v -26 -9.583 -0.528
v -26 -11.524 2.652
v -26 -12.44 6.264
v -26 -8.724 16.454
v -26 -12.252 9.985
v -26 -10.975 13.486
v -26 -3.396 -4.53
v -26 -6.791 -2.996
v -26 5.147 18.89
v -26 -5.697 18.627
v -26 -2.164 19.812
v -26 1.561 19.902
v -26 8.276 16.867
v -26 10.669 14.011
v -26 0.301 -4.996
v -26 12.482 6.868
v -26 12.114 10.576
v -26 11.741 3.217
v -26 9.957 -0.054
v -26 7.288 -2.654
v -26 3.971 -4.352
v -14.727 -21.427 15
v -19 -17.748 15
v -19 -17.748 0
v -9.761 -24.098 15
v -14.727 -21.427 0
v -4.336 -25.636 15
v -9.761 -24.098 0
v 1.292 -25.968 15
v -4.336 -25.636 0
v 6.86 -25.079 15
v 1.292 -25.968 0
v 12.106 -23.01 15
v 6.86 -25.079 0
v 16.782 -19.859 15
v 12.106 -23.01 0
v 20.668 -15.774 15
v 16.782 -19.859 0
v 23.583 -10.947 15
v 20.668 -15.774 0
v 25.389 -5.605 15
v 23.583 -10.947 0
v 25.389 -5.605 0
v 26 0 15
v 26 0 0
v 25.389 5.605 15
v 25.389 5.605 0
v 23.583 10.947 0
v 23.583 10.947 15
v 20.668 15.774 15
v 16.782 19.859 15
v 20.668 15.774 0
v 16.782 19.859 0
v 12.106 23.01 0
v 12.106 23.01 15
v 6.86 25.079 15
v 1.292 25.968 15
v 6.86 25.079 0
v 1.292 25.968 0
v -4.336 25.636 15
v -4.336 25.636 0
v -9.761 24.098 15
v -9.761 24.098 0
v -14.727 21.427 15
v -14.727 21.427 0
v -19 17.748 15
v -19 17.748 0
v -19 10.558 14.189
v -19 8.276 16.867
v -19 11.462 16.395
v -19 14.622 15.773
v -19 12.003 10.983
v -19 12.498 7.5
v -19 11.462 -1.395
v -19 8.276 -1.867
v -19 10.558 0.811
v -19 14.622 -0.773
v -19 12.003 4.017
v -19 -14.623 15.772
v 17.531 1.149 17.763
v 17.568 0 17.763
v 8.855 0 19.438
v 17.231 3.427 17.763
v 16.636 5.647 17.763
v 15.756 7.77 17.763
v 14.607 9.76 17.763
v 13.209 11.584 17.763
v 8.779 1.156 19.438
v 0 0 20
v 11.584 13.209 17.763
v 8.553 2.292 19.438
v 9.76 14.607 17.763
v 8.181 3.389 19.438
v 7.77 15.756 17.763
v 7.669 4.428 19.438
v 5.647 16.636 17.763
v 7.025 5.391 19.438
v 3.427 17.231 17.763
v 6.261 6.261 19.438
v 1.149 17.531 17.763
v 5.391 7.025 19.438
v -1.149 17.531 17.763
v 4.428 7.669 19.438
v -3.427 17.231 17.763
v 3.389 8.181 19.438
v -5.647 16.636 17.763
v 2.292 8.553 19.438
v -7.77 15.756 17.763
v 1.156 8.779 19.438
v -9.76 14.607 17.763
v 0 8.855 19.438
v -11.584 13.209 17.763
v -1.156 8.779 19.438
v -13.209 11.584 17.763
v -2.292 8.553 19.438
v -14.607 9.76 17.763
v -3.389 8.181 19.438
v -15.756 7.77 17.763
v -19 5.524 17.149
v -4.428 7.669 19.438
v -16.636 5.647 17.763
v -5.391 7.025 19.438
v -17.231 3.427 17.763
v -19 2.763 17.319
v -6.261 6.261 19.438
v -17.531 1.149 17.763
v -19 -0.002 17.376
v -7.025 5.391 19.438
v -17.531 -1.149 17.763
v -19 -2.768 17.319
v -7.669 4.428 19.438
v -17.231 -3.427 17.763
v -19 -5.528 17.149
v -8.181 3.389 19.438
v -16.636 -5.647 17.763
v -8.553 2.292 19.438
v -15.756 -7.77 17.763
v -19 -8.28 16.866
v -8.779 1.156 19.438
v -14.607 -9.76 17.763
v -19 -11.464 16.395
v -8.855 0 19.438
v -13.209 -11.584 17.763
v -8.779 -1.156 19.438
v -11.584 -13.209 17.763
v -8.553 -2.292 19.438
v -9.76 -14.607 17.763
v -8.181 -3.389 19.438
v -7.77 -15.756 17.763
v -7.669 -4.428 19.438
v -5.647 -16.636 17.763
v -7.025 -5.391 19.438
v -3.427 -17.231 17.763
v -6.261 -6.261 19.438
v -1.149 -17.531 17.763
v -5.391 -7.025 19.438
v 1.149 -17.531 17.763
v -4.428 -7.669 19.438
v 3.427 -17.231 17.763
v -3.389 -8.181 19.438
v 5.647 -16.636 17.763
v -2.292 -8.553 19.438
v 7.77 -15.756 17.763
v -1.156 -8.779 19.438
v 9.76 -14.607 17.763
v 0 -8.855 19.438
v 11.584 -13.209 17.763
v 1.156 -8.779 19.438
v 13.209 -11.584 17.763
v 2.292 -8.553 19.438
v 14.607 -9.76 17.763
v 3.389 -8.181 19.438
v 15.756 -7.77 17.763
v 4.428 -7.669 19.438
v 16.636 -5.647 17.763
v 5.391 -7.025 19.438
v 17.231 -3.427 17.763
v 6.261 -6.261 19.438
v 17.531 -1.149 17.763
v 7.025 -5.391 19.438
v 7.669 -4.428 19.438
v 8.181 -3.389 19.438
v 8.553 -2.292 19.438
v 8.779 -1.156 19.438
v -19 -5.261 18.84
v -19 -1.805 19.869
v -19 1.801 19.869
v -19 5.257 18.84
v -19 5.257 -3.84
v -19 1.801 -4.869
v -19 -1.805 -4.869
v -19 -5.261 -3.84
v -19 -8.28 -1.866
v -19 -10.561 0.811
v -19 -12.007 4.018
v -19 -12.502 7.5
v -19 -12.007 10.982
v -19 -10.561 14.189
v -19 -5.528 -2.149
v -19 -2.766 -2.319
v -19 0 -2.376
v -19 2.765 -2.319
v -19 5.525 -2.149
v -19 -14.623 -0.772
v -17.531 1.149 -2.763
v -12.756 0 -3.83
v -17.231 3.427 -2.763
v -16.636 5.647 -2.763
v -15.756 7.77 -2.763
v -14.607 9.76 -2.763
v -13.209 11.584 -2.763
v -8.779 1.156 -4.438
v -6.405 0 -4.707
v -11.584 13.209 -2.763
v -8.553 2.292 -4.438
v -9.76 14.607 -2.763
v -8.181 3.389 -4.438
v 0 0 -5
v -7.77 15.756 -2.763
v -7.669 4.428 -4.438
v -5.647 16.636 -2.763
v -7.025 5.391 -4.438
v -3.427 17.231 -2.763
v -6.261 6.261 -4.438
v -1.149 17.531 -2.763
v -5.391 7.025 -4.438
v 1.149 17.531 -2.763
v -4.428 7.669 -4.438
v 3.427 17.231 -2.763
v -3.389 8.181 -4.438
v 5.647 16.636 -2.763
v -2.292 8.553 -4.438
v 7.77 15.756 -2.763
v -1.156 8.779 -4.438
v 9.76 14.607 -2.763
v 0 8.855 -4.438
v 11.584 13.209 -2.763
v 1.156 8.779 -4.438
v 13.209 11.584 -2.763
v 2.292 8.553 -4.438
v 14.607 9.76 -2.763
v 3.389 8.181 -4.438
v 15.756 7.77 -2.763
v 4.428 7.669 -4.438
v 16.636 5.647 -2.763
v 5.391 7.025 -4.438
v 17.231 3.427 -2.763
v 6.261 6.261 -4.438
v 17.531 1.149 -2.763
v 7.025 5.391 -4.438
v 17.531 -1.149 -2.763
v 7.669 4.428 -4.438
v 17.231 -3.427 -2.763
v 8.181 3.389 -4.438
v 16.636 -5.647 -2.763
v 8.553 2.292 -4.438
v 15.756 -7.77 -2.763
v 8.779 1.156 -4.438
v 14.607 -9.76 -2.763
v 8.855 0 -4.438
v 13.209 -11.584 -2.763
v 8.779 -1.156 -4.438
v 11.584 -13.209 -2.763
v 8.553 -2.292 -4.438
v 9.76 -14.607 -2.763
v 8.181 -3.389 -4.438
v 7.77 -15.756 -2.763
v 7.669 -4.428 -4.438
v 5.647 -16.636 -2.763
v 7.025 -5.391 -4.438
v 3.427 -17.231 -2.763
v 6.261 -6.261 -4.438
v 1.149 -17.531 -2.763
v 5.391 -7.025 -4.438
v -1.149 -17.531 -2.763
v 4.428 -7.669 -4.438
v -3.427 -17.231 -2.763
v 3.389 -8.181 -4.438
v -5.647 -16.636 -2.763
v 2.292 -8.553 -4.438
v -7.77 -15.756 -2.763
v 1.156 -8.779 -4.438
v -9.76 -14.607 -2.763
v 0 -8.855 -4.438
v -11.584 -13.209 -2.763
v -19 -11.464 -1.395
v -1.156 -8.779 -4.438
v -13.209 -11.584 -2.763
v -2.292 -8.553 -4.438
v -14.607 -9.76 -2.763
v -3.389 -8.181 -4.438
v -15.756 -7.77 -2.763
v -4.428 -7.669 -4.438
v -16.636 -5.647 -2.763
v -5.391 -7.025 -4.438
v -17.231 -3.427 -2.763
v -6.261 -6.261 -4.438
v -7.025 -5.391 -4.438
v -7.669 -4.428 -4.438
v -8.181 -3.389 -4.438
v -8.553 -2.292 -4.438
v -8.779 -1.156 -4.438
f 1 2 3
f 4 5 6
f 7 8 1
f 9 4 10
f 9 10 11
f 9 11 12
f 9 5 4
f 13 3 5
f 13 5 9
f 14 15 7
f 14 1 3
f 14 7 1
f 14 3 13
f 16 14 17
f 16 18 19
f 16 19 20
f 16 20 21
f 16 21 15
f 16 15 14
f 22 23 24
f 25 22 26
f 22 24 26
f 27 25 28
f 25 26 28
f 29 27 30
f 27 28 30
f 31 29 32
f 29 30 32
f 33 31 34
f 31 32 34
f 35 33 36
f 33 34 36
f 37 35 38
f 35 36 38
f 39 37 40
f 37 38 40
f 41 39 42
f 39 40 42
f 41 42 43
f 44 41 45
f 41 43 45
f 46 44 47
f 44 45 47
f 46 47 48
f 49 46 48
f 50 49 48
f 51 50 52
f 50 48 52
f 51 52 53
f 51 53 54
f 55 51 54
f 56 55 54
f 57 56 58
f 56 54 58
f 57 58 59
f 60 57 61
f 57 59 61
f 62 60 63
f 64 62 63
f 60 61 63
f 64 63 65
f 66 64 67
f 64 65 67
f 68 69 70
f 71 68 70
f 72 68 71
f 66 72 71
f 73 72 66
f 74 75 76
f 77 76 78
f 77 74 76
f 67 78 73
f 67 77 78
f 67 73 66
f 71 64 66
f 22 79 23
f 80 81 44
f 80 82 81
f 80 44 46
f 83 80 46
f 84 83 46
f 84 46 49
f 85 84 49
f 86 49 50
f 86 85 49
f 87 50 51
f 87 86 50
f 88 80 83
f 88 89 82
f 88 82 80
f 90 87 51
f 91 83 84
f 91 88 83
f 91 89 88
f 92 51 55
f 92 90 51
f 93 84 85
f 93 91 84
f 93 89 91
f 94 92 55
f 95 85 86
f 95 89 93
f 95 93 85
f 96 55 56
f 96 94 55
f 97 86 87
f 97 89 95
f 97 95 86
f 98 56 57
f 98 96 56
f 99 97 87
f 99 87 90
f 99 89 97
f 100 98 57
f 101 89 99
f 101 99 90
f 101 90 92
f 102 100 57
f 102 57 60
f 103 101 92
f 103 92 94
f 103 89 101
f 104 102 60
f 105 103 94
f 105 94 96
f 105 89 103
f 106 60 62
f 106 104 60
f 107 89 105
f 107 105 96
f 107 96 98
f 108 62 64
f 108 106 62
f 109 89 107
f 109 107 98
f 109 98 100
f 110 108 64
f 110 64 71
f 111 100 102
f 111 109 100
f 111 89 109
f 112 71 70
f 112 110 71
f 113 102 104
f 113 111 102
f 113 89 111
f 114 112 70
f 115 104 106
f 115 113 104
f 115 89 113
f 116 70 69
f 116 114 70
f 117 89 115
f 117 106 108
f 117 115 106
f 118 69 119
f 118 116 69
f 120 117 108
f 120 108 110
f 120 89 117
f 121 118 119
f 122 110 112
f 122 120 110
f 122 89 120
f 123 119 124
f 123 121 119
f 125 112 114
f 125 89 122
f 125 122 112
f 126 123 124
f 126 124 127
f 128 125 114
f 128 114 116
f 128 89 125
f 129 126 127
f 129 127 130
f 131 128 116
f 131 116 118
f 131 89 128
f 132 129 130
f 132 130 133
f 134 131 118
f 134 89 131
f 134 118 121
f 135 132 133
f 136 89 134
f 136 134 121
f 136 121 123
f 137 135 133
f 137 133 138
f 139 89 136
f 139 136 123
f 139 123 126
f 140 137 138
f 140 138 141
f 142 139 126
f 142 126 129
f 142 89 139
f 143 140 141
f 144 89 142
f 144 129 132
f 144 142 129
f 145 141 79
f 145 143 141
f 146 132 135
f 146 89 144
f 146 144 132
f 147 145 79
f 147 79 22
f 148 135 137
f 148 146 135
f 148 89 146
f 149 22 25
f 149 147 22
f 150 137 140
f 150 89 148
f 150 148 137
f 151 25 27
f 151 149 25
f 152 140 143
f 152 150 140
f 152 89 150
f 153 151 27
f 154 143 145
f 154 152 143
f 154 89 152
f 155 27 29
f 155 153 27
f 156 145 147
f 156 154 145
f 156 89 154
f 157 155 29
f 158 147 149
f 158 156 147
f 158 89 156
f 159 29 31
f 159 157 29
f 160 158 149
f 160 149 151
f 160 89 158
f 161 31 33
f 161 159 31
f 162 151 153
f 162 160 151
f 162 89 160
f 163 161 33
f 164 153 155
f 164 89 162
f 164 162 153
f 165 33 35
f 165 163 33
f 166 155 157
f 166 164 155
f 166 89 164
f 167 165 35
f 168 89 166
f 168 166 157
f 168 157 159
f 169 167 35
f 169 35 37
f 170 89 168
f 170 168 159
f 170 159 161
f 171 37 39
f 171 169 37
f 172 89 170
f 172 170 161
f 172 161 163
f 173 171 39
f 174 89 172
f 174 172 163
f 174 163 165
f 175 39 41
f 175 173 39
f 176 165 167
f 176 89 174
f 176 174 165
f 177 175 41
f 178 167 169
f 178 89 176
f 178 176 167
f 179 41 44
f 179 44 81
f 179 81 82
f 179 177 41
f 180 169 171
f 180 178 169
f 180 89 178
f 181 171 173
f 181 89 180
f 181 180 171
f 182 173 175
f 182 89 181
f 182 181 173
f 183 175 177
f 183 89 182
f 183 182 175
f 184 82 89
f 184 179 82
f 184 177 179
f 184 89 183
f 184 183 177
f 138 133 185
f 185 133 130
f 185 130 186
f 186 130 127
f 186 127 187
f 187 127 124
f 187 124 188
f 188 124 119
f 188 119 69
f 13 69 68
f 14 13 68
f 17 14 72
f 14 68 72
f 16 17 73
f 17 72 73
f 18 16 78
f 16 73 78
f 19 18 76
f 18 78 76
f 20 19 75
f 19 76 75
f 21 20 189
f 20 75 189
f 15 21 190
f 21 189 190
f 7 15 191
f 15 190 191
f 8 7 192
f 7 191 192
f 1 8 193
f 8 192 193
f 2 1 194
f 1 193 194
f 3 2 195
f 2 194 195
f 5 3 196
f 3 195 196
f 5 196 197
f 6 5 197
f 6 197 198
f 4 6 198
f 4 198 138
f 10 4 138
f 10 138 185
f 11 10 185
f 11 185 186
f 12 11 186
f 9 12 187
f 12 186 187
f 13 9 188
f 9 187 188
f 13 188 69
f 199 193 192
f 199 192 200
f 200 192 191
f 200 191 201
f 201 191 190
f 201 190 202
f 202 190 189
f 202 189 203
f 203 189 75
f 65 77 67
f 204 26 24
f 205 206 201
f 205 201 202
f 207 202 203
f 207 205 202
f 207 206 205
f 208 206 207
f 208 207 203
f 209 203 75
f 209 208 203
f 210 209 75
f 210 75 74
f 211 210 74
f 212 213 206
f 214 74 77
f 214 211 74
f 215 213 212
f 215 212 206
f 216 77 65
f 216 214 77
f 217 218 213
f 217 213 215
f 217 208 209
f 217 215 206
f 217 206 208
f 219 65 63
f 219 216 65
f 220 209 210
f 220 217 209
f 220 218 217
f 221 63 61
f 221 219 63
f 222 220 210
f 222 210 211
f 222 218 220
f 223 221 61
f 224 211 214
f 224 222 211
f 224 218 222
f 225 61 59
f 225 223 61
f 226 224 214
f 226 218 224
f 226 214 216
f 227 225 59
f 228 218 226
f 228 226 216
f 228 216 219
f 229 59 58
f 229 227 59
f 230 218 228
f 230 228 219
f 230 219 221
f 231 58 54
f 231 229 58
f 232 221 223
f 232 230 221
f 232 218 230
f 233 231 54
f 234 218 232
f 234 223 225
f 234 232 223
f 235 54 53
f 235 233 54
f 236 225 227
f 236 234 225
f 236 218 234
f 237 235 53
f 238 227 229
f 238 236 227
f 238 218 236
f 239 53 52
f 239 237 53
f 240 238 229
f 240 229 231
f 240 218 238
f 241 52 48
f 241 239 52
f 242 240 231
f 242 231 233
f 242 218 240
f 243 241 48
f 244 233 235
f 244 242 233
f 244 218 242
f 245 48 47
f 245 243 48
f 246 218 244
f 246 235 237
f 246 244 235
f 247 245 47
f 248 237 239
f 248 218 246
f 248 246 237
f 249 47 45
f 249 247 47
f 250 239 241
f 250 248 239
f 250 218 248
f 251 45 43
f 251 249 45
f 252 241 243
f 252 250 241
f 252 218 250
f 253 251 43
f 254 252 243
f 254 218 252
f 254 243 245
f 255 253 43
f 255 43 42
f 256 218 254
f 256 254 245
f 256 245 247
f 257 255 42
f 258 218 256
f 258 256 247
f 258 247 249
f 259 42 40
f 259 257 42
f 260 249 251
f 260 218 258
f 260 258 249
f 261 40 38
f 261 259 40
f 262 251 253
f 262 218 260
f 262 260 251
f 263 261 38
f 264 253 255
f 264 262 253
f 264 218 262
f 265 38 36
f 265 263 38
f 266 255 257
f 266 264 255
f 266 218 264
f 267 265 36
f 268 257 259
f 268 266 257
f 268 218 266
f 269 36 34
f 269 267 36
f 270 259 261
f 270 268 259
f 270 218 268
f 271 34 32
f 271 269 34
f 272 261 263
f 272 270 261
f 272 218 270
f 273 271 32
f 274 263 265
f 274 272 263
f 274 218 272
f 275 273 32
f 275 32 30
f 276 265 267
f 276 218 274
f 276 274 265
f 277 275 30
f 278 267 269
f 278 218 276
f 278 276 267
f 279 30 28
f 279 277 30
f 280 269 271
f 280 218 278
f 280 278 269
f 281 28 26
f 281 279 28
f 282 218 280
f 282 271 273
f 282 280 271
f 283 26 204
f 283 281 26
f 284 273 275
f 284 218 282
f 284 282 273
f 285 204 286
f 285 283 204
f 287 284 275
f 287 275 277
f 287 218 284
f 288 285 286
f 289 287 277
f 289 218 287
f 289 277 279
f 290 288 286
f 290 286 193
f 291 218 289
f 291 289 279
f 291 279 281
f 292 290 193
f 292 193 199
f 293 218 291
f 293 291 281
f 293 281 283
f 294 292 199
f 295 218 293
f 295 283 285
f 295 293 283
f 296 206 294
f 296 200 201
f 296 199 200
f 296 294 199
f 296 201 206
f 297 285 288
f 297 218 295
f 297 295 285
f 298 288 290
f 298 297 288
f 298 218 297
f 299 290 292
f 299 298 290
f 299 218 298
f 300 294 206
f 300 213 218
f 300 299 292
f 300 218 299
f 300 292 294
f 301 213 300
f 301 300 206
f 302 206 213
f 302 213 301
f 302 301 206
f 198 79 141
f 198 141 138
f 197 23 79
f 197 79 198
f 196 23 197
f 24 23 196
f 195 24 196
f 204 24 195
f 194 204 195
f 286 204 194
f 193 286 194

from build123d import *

# Parameters (mm, degrees)
ESQUISSE1_R           = 26
EXTRUSION1_DEPTH      = 15
D_ME1_FACE_RADIUS     = 26
D_ME1_HEIGHT          = 5
D_ME2_FACE_RADIUS     = 26
D_ME2_HEIGHT          = 5
EXTRUSION2_DEPTH      = 42.856899073
EXTRUSION2_DEPTH_BACK = 42.856899073
ESQUISSE2_W           = 16.897481419
ESQUISSE2_H           = 62.481047215
ESQUISSE3_R           = 12.5
EXTRUSION3_DEPTH      = 7


with BuildPart() as part:
    # Esquisse1 → Extrusion1 (new body)
    with BuildSketch(Plane.XY):
        Circle(ESQUISSE1_R)
    extrude(amount=EXTRUSION1_DEPTH)

    # Dôme1: a dome of height H over a round flat face of radius A is a cap of a sphere of radius (A * A + H * H) / (2 * H)
    d_me1_r = (D_ME1_FACE_RADIUS * D_ME1_FACE_RADIUS + D_ME1_HEIGHT * D_ME1_HEIGHT) / (2 * D_ME1_HEIGHT)
    d_me1_base = Plane((0, 0, 15), z_dir=(0, 0, 1))
    with Locations(d_me1_base.offset(D_ME1_HEIGHT - d_me1_r)):
        d_me1_ball = Sphere(d_me1_r, mode=Mode.PRIVATE)
    add(split(d_me1_ball, bisect_by=d_me1_base, keep=Keep.TOP, mode=Mode.PRIVATE))

    # Dôme2: a dome of height H over a round flat face of radius A is a cap of a sphere of radius (A * A + H * H) / (2 * H)
    d_me2_r = (D_ME2_FACE_RADIUS * D_ME2_FACE_RADIUS + D_ME2_HEIGHT * D_ME2_HEIGHT) / (2 * D_ME2_HEIGHT)
    d_me2_base = Plane((0, 0, 0), z_dir=(0, 0, -1))
    with Locations(d_me2_base.offset(D_ME2_HEIGHT - d_me2_r)):
        d_me2_ball = Sphere(d_me2_r, mode=Mode.PRIVATE)
    add(split(d_me2_ball, bisect_by=d_me2_base, keep=Keep.TOP, mode=Mode.PRIVATE))

    # Esquisse2 → Extrusion2 (cut, two sides: drawn at the far end of the back side and taken through both)
    with BuildSketch(Plane.XY.offset(-EXTRUSION2_DEPTH_BACK)):
        with Locations((-27.44874071, 0.855485378)):
            Rectangle(ESQUISSE2_W, ESQUISSE2_H)
    extrude(amount=EXTRUSION2_DEPTH + EXTRUSION2_DEPTH_BACK, mode=Mode.SUBTRACT)

    # Esquisse3 → Extrusion3 (add)
    with BuildSketch(Plane.ZY.offset(19)):
        with Locations(Location((7.5, -0.001760651, 0), (0, 0, 41.467990135))):
            Circle(ESQUISSE3_R)
    extrude(amount=EXTRUSION3_DEPTH)


solid = part.part
